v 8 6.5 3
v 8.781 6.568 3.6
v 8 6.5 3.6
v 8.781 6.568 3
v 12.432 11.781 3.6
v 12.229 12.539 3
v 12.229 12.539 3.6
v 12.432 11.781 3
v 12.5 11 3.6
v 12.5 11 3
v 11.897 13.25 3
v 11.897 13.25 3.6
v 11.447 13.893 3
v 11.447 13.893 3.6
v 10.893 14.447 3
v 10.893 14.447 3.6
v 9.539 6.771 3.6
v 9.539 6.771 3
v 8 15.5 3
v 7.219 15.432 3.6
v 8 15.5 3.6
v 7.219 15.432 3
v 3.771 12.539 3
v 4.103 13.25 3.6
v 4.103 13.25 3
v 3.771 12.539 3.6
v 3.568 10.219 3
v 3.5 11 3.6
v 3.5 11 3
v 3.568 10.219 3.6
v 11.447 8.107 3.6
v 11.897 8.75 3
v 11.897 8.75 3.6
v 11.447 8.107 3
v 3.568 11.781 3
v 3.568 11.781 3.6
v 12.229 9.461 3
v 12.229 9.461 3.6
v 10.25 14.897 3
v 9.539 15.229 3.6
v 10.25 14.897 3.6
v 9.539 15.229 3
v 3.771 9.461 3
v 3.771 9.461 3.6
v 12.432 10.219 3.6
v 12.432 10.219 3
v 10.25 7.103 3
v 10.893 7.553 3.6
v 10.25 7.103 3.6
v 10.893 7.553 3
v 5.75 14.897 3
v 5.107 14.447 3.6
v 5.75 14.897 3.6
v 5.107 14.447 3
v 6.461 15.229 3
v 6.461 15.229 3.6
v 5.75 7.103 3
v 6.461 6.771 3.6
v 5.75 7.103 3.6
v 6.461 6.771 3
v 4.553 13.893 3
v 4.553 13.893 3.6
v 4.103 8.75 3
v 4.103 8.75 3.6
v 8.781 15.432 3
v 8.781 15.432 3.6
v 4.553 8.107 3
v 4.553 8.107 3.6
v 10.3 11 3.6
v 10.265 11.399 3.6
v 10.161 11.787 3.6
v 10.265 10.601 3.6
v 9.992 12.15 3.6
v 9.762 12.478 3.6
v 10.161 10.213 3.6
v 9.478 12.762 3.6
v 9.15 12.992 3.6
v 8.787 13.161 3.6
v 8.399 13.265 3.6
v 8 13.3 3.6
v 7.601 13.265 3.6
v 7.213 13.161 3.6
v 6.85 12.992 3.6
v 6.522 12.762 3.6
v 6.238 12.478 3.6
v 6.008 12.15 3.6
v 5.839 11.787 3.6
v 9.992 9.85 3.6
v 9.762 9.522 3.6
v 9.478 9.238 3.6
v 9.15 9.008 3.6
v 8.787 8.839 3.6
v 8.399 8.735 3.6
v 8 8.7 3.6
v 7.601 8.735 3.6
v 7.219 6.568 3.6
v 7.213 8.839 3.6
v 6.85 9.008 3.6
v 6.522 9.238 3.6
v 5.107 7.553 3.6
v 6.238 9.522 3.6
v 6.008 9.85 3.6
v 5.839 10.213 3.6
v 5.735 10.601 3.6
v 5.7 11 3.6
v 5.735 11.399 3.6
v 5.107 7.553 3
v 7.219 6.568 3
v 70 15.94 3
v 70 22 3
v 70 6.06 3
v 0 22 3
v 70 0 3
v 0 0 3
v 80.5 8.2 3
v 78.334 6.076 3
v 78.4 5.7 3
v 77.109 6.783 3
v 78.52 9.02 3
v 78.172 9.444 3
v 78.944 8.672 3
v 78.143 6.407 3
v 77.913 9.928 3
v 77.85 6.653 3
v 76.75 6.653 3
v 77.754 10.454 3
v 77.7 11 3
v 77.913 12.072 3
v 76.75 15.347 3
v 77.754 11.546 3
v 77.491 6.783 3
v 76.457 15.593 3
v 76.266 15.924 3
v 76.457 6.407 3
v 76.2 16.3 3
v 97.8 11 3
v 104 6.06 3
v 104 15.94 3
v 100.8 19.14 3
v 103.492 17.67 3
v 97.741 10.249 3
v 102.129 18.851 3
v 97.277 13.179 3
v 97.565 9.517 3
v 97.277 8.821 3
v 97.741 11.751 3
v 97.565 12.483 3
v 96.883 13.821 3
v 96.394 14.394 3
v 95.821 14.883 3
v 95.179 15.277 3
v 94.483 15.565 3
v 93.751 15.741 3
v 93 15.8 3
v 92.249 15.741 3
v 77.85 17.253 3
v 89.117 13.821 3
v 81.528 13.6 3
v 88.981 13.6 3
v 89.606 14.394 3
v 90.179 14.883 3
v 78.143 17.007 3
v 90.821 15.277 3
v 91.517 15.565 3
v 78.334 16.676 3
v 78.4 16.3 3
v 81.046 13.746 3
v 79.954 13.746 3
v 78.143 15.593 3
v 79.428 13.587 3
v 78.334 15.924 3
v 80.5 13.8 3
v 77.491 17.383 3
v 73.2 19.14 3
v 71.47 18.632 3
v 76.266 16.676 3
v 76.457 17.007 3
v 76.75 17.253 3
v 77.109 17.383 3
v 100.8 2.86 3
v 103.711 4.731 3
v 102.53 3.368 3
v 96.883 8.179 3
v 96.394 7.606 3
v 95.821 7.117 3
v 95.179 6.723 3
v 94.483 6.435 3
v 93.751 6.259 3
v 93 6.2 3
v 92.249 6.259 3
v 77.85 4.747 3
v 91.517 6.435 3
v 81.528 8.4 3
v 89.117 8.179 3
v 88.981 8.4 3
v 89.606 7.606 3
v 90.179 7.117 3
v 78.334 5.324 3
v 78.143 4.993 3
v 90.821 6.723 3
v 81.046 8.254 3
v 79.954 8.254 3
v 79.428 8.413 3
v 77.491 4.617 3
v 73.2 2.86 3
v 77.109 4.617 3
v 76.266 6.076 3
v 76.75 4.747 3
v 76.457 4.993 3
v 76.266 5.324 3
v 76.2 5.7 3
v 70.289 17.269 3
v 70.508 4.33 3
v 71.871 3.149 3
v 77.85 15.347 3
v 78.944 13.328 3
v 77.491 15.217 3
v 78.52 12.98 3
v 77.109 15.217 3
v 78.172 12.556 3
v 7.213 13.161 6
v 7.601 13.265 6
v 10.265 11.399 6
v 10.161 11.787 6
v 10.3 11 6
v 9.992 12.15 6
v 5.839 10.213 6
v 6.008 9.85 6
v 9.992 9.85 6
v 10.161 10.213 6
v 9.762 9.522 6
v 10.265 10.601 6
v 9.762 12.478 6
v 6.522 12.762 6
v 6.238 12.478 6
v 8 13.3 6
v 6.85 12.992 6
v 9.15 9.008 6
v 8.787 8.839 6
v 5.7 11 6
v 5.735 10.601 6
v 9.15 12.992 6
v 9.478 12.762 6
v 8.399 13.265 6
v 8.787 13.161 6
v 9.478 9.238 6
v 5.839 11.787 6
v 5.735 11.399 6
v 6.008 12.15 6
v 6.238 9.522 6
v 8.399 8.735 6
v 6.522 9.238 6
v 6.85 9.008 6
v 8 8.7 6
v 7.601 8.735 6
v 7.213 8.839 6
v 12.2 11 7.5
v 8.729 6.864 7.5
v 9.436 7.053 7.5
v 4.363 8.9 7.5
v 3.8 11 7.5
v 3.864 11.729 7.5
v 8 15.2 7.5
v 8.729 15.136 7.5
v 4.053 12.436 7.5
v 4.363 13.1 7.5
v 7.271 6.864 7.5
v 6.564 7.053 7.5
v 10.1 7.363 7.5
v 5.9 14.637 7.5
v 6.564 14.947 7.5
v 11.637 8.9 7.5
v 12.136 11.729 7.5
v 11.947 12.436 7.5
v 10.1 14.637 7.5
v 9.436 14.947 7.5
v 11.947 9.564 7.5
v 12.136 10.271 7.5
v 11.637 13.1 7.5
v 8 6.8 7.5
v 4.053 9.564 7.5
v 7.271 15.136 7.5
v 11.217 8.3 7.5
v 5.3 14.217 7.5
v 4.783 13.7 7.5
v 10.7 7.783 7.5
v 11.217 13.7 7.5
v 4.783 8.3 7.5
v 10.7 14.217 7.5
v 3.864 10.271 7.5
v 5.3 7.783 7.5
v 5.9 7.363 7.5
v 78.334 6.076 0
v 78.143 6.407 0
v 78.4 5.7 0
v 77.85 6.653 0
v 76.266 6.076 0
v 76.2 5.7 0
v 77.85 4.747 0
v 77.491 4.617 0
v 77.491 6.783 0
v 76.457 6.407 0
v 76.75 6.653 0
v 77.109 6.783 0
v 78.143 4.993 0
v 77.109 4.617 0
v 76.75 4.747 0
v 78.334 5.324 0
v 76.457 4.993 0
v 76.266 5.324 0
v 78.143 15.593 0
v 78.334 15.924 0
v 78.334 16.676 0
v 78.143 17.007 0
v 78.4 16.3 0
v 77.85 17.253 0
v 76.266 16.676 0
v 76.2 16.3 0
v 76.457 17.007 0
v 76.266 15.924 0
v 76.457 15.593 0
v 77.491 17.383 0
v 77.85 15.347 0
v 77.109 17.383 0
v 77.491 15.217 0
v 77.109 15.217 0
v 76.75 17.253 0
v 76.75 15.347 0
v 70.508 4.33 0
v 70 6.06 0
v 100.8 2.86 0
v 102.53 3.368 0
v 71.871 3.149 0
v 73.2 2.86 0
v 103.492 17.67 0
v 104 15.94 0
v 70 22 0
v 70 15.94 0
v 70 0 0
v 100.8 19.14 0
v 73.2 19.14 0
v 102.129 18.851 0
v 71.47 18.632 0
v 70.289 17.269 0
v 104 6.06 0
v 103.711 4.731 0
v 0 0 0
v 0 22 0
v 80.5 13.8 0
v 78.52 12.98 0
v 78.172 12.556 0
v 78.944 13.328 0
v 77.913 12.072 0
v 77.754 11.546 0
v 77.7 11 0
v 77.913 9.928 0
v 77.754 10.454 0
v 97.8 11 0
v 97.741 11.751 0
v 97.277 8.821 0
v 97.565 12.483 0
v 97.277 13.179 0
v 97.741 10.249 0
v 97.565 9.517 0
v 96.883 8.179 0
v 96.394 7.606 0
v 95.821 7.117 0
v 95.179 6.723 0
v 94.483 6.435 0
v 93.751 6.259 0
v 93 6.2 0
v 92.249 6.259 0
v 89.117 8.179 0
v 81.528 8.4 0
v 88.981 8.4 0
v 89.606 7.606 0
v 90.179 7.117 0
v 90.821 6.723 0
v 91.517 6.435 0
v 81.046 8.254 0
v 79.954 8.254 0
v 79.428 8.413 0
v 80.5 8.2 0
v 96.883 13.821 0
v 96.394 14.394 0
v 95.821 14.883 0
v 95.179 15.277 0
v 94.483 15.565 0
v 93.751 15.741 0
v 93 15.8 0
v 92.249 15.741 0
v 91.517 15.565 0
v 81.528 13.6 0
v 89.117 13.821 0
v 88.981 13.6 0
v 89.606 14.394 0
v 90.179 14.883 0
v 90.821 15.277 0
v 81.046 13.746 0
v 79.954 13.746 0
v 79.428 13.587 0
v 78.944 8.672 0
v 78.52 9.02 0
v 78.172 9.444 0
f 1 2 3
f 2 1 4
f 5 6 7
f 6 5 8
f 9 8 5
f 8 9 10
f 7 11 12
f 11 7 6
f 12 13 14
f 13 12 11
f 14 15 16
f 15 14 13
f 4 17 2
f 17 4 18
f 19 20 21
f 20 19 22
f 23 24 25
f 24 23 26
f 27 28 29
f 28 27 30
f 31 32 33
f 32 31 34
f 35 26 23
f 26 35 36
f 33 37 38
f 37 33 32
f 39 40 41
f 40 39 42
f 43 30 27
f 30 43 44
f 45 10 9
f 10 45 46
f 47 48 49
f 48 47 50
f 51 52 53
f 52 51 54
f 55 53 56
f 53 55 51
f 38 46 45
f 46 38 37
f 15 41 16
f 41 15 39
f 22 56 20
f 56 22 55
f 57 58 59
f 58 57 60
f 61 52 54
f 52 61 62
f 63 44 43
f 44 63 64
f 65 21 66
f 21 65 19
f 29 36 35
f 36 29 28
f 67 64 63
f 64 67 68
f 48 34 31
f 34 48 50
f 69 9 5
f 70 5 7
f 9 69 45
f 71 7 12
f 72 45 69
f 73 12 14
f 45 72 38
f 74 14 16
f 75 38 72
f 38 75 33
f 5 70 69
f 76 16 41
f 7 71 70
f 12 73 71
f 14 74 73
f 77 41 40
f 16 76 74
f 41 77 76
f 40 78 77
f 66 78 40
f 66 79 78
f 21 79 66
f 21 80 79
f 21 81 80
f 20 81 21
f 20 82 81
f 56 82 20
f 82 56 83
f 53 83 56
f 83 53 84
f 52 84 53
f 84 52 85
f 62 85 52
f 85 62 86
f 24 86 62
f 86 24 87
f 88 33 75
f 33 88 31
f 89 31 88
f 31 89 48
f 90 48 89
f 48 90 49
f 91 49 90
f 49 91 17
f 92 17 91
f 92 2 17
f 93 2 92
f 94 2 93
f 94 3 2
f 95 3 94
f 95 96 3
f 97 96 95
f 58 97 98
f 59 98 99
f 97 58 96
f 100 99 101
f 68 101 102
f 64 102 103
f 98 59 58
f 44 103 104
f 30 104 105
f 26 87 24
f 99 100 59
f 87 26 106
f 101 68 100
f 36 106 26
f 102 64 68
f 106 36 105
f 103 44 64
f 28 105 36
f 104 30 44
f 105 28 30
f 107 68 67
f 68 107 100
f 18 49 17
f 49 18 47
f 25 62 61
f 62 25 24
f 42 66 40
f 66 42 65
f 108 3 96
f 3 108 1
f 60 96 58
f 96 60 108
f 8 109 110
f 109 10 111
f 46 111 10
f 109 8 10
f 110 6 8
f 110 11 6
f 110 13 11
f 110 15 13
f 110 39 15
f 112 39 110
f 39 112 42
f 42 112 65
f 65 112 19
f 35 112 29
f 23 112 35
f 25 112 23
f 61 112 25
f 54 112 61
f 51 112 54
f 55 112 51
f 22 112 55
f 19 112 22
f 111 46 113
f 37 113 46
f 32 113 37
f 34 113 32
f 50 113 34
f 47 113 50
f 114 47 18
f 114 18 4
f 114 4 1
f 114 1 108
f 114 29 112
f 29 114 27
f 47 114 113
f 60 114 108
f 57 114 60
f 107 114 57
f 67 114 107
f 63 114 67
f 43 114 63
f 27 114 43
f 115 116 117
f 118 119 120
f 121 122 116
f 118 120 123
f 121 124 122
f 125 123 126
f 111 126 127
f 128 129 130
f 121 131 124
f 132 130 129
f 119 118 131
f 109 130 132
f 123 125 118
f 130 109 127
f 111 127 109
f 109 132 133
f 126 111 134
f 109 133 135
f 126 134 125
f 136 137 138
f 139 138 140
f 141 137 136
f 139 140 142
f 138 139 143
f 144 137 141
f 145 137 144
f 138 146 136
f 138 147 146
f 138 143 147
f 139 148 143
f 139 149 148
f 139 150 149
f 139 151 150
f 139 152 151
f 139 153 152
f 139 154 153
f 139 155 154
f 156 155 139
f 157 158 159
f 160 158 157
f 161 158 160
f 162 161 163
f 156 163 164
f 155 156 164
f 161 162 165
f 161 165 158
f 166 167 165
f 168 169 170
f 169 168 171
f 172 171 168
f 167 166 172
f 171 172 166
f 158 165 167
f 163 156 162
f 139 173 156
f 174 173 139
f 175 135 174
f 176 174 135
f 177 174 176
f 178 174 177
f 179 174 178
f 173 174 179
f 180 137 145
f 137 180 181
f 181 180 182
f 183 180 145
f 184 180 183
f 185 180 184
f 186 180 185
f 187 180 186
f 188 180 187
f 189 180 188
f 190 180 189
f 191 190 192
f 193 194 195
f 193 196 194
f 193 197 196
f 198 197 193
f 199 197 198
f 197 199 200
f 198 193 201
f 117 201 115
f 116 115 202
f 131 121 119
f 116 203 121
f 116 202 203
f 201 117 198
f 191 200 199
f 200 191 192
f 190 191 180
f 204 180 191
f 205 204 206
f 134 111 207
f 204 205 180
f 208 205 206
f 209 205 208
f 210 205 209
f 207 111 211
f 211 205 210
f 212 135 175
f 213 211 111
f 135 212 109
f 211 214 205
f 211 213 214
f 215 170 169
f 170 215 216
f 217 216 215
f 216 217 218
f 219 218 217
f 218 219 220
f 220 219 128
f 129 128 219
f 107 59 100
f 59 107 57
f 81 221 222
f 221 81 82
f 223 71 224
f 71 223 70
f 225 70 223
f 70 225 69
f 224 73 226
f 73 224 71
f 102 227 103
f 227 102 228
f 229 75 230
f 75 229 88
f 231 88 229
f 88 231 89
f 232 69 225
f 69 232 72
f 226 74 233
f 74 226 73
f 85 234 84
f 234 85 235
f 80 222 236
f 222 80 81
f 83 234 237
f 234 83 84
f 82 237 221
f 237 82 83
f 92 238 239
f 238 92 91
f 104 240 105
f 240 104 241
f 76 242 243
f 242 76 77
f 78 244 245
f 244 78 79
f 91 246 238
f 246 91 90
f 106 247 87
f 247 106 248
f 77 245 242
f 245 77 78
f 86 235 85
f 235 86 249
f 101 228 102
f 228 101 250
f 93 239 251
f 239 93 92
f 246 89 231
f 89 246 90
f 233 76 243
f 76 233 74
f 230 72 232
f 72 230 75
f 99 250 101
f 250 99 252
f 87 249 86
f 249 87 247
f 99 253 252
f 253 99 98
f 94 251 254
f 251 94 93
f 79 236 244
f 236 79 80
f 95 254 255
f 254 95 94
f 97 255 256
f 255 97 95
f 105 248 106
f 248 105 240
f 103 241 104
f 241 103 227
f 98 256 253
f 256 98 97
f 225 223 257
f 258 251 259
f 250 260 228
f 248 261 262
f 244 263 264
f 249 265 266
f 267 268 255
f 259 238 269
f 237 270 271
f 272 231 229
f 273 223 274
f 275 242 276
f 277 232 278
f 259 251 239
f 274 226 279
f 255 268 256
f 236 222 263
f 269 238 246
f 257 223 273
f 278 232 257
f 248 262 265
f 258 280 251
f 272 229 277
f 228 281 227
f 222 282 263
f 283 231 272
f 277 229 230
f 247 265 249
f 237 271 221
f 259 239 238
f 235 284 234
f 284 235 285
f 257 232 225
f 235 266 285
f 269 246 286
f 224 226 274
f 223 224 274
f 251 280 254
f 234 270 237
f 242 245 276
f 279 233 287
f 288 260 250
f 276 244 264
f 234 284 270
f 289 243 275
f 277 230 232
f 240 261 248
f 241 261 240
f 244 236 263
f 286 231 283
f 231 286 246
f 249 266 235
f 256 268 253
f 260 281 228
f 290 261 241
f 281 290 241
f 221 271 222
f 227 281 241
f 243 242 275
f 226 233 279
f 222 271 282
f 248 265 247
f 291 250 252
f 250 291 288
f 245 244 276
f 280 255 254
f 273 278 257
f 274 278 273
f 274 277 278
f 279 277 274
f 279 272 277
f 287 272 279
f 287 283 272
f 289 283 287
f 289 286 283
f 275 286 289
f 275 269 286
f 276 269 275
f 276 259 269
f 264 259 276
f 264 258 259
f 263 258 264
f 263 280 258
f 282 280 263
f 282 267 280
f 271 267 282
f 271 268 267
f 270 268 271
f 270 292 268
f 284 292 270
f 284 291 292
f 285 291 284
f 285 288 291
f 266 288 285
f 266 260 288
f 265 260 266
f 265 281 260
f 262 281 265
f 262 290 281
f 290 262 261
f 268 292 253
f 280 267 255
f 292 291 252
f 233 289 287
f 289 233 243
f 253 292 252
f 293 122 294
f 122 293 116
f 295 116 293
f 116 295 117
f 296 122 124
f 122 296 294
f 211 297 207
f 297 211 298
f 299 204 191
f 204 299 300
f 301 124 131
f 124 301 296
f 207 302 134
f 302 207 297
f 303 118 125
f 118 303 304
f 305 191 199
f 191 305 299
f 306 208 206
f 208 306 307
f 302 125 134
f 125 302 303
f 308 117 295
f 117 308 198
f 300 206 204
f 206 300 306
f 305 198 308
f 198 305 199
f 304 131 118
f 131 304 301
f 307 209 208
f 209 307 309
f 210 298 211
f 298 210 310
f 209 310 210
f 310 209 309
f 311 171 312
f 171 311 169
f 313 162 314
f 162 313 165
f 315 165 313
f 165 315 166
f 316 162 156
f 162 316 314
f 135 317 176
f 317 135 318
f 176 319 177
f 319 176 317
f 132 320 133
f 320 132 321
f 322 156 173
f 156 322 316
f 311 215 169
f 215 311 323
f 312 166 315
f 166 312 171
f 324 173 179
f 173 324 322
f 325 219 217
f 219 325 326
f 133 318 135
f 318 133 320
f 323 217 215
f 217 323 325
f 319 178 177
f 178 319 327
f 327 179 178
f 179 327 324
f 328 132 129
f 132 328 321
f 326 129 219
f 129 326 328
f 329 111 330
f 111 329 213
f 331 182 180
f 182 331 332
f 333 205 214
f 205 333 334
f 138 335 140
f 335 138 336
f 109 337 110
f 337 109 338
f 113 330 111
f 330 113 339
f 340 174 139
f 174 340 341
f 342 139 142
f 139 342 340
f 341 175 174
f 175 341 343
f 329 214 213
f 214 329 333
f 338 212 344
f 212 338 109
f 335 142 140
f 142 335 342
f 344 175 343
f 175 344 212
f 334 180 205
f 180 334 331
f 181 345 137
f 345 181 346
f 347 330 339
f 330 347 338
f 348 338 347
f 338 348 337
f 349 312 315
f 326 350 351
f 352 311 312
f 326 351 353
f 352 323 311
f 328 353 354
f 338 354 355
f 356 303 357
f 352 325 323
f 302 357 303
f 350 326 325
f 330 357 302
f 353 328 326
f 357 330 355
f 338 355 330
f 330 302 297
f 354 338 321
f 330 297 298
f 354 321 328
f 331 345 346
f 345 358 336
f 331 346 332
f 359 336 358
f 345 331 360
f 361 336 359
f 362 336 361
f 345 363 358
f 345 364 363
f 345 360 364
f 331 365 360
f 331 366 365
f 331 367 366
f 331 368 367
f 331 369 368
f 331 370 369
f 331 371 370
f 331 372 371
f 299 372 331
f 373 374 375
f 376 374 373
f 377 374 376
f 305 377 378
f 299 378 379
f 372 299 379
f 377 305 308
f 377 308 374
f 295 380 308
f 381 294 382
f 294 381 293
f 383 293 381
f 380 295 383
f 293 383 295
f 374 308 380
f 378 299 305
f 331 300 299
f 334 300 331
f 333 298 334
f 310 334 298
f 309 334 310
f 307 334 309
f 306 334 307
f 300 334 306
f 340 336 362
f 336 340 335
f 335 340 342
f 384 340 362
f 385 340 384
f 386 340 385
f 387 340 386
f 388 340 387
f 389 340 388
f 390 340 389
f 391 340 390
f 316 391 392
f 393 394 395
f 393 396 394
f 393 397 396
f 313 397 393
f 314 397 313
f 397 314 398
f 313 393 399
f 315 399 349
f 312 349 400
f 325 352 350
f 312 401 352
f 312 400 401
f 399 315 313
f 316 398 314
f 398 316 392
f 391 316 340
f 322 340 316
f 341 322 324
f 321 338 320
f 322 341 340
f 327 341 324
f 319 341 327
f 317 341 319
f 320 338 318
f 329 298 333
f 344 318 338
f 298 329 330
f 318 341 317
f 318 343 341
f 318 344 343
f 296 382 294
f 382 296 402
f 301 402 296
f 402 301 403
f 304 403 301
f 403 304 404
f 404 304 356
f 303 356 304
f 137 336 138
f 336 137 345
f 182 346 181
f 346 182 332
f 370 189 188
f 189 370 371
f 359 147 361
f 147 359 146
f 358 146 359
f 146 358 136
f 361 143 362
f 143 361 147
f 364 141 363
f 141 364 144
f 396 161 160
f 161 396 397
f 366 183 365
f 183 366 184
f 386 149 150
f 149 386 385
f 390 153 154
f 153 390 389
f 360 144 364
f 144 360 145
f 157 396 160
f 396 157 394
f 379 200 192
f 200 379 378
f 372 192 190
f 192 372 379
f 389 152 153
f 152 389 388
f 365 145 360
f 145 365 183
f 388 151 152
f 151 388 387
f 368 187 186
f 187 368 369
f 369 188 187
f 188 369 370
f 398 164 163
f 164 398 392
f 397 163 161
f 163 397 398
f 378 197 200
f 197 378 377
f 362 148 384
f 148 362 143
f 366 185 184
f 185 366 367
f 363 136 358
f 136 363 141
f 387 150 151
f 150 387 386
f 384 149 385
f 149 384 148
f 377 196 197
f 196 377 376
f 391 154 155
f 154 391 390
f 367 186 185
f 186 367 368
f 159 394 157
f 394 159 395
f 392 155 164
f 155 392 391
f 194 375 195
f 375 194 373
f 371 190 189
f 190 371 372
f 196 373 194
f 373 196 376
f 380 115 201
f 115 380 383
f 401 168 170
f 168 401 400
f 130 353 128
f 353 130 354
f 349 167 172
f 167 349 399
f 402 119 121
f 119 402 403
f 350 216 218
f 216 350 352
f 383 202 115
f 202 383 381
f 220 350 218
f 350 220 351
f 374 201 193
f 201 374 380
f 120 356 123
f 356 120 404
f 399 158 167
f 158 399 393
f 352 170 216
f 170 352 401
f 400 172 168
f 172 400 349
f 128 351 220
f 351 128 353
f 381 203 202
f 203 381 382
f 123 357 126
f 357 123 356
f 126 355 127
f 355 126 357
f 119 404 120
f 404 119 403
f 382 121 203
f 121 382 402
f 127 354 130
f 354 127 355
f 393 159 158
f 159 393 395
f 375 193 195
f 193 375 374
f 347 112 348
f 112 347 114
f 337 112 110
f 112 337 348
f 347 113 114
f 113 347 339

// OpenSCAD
// latches/loop_post_v2.scad — lower loop/post toggle with a guided keyhole.
// MIT licensed.
//
// Compared with loop_post.scad, this version lowers the post, moves it inboard,
// and gives the loop a large entry hole plus a narrower capture throat.

LOOP2_POST_INSET    = 8;
LOOP2_SHAFT_D       = 4.6;
LOOP2_HEAD_D        = 8.4;
LOOP2_SHAFT_HEIGHT  = 3.0;
LOOP2_HEAD_HEIGHT   = 1.5;
LOOP2_BASE_D        = 9.0;
LOOP2_TAB_LENGTH    = 34;
LOOP2_TAB_WIDTH_FR  = 0.74;
LOOP2_ENTRY_D       = 9.6;
LOOP2_CAPTURE_D     = 5.6;
LOOP2_THROAT_W      = 5.2;
LOOP2_ENTRY_X       = 23;
LOOP2_CAPTURE_X     = 10.5;
LOOP2_RELIEF_D      = 2.2;

module _loop2_round_rect_2d(length, width, radius) {
    offset(r = radius) offset(delta = -radius)
        square([length, width], center = false);
}

module _loop2_post(band_width, band_thickness) {
    translate([LOOP2_POST_INSET, band_width / 2, band_thickness])
        union() {
            cylinder(h = 0.6, d = LOOP2_BASE_D, $fn = 36);
            cylinder(h = LOOP2_SHAFT_HEIGHT, d = LOOP2_SHAFT_D, $fn = 36);
            translate([0, 0, LOOP2_SHAFT_HEIGHT])
                cylinder(
                    h = LOOP2_HEAD_HEIGHT,
                    r1 = LOOP2_SHAFT_D / 2,
                    r2 = LOOP2_HEAD_D / 2,
                    $fn = 36
                );
        }
}

module _loop2_tab(band_width, band_thickness) {
    tab_w = min(band_width * LOOP2_TAB_WIDTH_FR, band_width - 4);
    y0 = (band_width - tab_w) / 2;
    cy = band_width / 2;

    translate([0, y0, 0])
        difference() {
            linear_extrude(height = band_thickness)
                _loop2_round_rect_2d(LOOP2_TAB_LENGTH, tab_w, 3.2);

            translate([LOOP2_ENTRY_X, cy - y0, -0.1])
                cylinder(h = band_thickness + 0.2, d = LOOP2_ENTRY_D, $fn = 40);

            translate([LOOP2_CAPTURE_X, cy - y0, -0.1])
                cylinder(h = band_thickness + 0.2, d = LOOP2_CAPTURE_D, $fn = 32);

            translate([
                LOOP2_CAPTURE_X,
                cy - y0 - LOOP2_THROAT_W / 2,
                -0.1
            ])
                cube([
                    LOOP2_ENTRY_X - LOOP2_CAPTURE_X,
                    LOOP2_THROAT_W,
                    band_thickness + 0.2
                ]);

            for (side = [-1, 1])
                translate([
                    LOOP2_CAPTURE_X - 3.2,
                    cy - y0 + side * (LOOP2_CAPTURE_D / 2 + 2.5),
                    -0.1
                ])
                    cylinder(h = band_thickness + 0.2, d = LOOP2_RELIEF_D, $fn = 18);
        }
}

module latch_loop_post_v2(band_width, band_thickness, end = "both") {
    if (end == "left" || end == "both")
        _loop2_post(band_width, band_thickness);

    if (end == "right" || end == "both")
        _loop2_tab(band_width, band_thickness);
}

// development render
translate([0, 0, 0]) cube([70, 22, 3]);
latch_loop_post_v2(22, 3, end = "left");
translate([70, 0, 0]) latch_loop_post_v2(22, 3, end = "right");
